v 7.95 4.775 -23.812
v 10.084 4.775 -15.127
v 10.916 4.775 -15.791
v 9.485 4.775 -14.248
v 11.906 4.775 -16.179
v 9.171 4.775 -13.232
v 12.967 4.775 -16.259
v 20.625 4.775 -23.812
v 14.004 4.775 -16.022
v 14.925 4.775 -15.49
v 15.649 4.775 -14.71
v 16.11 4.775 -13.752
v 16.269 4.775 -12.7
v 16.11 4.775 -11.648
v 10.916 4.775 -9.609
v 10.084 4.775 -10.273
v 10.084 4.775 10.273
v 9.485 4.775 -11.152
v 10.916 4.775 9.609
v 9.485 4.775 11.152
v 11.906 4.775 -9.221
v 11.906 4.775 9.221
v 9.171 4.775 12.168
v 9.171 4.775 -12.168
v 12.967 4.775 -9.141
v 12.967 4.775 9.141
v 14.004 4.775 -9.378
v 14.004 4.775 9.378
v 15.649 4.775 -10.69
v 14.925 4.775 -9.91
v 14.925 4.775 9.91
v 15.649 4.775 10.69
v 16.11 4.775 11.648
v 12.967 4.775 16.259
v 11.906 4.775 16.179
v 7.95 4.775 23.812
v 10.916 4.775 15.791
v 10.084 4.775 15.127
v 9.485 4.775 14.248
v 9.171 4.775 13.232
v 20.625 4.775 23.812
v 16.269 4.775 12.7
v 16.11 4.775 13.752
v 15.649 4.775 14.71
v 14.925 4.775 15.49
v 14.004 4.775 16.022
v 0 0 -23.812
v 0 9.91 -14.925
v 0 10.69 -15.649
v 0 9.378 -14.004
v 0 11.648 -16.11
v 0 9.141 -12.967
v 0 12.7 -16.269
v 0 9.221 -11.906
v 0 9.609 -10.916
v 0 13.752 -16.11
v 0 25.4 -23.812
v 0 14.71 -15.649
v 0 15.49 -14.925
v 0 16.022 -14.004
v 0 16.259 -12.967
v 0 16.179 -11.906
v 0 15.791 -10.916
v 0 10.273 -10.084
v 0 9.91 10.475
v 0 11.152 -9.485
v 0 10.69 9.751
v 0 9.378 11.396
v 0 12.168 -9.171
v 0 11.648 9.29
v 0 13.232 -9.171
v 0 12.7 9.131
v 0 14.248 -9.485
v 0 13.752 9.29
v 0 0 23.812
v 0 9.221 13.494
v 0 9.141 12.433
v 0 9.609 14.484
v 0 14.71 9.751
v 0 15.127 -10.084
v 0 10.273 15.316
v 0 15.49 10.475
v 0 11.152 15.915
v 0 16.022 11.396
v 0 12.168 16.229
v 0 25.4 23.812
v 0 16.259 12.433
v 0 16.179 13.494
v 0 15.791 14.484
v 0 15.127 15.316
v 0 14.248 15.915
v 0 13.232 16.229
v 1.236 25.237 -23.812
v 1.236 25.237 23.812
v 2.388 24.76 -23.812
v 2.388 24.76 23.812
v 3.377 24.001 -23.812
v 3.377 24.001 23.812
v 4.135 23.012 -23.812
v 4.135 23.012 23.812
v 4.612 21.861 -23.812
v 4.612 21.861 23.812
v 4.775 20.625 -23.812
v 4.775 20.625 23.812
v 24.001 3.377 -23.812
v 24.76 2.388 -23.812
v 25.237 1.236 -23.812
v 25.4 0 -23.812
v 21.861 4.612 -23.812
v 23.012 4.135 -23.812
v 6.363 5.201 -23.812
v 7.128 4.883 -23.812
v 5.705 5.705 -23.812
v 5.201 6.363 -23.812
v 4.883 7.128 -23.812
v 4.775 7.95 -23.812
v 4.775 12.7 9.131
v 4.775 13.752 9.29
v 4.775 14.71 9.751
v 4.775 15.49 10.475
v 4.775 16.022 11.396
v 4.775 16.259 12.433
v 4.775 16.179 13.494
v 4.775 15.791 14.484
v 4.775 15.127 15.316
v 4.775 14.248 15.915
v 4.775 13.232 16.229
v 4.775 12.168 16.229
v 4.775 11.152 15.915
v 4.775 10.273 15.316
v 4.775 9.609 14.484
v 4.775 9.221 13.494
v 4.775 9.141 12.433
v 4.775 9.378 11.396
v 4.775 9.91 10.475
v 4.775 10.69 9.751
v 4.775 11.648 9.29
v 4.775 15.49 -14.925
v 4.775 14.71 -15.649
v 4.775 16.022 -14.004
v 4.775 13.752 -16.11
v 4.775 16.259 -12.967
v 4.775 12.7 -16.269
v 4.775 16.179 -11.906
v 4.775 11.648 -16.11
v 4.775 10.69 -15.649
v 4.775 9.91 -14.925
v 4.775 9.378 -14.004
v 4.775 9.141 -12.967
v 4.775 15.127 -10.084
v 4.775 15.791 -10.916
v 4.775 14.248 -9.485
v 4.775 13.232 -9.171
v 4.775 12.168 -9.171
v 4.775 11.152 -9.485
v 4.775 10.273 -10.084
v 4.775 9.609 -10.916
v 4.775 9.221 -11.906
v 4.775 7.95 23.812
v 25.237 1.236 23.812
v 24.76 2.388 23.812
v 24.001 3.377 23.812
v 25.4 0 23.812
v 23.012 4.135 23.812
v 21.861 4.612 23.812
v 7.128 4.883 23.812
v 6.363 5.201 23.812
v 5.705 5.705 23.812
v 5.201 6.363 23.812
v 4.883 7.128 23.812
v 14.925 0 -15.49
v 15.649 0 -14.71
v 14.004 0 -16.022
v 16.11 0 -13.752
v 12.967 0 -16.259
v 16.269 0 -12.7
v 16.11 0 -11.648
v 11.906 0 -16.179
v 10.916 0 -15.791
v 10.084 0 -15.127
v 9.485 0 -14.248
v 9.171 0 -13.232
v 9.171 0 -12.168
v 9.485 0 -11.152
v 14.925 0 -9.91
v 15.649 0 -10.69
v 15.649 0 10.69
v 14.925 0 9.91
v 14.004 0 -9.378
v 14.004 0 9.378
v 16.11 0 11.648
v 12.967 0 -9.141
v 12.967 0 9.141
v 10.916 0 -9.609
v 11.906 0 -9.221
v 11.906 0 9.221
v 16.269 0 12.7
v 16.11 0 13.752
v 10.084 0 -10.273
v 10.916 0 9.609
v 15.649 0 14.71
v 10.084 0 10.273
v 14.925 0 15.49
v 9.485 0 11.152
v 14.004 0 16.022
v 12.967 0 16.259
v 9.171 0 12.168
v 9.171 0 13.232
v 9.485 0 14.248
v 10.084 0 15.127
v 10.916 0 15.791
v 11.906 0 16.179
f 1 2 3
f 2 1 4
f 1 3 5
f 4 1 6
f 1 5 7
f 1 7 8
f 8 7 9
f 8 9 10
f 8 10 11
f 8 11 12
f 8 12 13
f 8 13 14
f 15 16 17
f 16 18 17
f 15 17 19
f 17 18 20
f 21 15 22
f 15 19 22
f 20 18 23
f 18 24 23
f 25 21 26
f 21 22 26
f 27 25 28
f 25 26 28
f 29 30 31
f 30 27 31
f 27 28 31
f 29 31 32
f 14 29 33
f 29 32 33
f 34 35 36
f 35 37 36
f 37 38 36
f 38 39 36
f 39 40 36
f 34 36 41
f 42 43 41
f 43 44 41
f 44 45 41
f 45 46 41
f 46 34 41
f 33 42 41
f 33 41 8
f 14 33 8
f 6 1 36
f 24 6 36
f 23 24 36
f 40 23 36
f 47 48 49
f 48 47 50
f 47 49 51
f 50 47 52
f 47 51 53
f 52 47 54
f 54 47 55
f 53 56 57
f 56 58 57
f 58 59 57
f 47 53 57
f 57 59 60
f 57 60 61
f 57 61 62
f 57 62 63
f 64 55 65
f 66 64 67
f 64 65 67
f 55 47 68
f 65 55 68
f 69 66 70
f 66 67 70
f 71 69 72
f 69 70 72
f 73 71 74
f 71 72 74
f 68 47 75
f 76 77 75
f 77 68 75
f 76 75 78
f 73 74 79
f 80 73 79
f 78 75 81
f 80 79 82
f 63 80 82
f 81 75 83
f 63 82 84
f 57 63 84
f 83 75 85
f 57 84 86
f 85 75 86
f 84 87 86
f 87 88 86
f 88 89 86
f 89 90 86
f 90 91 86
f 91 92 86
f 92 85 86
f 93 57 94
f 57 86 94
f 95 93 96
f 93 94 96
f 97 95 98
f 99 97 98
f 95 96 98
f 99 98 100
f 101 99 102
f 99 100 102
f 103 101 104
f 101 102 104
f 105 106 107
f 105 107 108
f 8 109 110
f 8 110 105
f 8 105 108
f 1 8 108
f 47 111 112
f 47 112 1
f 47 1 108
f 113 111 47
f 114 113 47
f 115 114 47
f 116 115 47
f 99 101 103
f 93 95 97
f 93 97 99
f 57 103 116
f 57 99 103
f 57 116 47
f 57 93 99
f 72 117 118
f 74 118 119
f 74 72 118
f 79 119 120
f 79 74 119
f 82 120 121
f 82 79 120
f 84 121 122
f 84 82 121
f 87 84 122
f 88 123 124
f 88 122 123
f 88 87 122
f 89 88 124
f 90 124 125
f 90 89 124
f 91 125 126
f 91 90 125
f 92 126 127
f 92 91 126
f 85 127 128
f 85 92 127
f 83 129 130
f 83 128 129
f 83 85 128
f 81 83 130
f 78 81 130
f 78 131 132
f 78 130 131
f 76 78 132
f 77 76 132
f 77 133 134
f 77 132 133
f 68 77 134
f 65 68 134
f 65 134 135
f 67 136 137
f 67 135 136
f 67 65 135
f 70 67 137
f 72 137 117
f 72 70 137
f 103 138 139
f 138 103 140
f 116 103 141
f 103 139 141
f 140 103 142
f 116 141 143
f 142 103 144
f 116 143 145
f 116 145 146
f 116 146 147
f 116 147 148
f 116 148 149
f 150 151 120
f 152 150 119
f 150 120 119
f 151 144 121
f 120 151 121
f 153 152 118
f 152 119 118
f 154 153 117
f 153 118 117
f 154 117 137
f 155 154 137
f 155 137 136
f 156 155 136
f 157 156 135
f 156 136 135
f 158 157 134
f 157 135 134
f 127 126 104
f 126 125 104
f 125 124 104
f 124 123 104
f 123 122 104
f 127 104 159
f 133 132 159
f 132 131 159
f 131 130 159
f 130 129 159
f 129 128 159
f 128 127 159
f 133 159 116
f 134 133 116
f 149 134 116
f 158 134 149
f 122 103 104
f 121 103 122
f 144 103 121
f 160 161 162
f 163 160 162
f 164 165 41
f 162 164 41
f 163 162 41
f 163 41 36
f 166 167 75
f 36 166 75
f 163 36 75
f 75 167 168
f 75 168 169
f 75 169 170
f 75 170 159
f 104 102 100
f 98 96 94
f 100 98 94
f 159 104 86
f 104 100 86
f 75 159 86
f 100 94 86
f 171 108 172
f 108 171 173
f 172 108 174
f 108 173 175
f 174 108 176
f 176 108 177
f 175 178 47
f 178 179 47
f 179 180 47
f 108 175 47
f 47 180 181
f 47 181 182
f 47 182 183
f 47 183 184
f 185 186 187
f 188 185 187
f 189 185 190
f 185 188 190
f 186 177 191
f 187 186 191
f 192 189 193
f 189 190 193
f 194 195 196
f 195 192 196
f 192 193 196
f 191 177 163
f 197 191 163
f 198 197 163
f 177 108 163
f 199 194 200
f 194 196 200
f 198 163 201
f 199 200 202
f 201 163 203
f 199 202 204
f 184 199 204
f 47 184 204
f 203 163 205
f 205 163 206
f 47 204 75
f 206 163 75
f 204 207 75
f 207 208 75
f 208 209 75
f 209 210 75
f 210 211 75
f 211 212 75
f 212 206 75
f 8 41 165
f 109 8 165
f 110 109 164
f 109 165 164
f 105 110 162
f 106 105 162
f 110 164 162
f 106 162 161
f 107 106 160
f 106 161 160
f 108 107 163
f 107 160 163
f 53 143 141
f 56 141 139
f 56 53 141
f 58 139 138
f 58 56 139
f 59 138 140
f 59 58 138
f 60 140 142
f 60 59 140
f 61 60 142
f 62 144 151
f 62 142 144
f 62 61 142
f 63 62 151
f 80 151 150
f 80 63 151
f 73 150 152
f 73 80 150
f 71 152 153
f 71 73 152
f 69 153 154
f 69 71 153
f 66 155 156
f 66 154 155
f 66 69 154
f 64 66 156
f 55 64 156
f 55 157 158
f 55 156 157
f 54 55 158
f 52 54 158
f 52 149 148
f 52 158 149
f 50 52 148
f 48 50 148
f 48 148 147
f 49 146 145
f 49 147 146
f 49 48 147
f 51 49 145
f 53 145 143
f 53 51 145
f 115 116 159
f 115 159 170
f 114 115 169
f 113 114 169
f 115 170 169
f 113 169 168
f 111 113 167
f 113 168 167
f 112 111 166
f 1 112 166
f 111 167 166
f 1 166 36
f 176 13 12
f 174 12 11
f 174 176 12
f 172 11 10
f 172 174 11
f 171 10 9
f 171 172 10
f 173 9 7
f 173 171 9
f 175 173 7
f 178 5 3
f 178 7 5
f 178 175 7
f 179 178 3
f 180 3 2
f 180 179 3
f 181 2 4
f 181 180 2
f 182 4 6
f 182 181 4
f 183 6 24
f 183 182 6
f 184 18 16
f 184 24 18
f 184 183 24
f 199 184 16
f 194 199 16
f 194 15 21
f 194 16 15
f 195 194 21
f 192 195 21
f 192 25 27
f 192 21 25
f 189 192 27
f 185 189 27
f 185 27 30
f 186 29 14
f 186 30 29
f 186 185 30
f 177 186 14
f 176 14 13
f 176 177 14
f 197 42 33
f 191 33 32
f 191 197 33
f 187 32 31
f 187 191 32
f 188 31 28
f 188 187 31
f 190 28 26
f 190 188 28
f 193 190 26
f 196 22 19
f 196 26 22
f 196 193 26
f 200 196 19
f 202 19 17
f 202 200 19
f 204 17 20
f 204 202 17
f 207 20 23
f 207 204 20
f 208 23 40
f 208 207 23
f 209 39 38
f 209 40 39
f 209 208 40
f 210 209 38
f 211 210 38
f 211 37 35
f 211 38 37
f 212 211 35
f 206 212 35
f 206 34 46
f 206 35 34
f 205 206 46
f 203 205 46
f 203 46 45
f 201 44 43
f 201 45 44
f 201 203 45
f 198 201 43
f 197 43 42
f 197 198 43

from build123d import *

# Parameters (mm, degrees)
BOSS_EXTRUDE1_DEPTH = 23.8125
SKETCH2_R           = 3.5687
CUT_EXTRUDE1_DEPTH  = 26.4
SKETCH3_R           = 3.5687
CUT_EXTRUDE2_DEPTH  = 26.4


with BuildPart() as part:
    # Sketch1 → Boss-Extrude1 (new body, symmetric)
    with BuildSketch(Plane.XY):
        with BuildLine():
            Line((0, 0), (0, 25.4))
            ThreePointArc((0, 25.4), (3.376576302, 24.001376302), (4.7752, 20.6248))
            Line((4.7752, 20.6248), (4.7752, 7.9502))
            ThreePointArc((4.7752, 7.9502), (5.70513597, 5.70513597), (7.9502, 4.7752))
            Line((7.9502, 4.7752), (20.6248, 4.7752))
            ThreePointArc((20.6248, 4.7752), (24.001376302, 3.376576302), (25.4, 0))
            Line((25.4, 0), (0, 0))
        make_face()
    extrude(amount=BOSS_EXTRUDE1_DEPTH, both=True)

    # Sketch2 → Cut-Extrude1 (cut, through all)
    with BuildSketch(Plane(origin=(0, 0, 0), x_dir=(1, 0, 0), z_dir=(0, 1, 0))):
        with Locations((12.7, -12.7)):
            Circle(SKETCH2_R)
        with Locations((12.7, 12.7)):
            Circle(SKETCH2_R)
    extrude(amount=CUT_EXTRUDE1_DEPTH, mode=Mode.SUBTRACT)

    # Sketch3 → Cut-Extrude2 (cut, through all)
    with BuildSketch(Plane(origin=(0, 0, 0), x_dir=(0, 0, -1), z_dir=(1, 0, 0))):
        with Locations((-12.7, 12.7)):
            Circle(SKETCH3_R)
        with Locations((12.7, 12.7)):
            Circle(SKETCH3_R)
    extrude(amount=CUT_EXTRUDE2_DEPTH, mode=Mode.SUBTRACT)


solid = part.part
